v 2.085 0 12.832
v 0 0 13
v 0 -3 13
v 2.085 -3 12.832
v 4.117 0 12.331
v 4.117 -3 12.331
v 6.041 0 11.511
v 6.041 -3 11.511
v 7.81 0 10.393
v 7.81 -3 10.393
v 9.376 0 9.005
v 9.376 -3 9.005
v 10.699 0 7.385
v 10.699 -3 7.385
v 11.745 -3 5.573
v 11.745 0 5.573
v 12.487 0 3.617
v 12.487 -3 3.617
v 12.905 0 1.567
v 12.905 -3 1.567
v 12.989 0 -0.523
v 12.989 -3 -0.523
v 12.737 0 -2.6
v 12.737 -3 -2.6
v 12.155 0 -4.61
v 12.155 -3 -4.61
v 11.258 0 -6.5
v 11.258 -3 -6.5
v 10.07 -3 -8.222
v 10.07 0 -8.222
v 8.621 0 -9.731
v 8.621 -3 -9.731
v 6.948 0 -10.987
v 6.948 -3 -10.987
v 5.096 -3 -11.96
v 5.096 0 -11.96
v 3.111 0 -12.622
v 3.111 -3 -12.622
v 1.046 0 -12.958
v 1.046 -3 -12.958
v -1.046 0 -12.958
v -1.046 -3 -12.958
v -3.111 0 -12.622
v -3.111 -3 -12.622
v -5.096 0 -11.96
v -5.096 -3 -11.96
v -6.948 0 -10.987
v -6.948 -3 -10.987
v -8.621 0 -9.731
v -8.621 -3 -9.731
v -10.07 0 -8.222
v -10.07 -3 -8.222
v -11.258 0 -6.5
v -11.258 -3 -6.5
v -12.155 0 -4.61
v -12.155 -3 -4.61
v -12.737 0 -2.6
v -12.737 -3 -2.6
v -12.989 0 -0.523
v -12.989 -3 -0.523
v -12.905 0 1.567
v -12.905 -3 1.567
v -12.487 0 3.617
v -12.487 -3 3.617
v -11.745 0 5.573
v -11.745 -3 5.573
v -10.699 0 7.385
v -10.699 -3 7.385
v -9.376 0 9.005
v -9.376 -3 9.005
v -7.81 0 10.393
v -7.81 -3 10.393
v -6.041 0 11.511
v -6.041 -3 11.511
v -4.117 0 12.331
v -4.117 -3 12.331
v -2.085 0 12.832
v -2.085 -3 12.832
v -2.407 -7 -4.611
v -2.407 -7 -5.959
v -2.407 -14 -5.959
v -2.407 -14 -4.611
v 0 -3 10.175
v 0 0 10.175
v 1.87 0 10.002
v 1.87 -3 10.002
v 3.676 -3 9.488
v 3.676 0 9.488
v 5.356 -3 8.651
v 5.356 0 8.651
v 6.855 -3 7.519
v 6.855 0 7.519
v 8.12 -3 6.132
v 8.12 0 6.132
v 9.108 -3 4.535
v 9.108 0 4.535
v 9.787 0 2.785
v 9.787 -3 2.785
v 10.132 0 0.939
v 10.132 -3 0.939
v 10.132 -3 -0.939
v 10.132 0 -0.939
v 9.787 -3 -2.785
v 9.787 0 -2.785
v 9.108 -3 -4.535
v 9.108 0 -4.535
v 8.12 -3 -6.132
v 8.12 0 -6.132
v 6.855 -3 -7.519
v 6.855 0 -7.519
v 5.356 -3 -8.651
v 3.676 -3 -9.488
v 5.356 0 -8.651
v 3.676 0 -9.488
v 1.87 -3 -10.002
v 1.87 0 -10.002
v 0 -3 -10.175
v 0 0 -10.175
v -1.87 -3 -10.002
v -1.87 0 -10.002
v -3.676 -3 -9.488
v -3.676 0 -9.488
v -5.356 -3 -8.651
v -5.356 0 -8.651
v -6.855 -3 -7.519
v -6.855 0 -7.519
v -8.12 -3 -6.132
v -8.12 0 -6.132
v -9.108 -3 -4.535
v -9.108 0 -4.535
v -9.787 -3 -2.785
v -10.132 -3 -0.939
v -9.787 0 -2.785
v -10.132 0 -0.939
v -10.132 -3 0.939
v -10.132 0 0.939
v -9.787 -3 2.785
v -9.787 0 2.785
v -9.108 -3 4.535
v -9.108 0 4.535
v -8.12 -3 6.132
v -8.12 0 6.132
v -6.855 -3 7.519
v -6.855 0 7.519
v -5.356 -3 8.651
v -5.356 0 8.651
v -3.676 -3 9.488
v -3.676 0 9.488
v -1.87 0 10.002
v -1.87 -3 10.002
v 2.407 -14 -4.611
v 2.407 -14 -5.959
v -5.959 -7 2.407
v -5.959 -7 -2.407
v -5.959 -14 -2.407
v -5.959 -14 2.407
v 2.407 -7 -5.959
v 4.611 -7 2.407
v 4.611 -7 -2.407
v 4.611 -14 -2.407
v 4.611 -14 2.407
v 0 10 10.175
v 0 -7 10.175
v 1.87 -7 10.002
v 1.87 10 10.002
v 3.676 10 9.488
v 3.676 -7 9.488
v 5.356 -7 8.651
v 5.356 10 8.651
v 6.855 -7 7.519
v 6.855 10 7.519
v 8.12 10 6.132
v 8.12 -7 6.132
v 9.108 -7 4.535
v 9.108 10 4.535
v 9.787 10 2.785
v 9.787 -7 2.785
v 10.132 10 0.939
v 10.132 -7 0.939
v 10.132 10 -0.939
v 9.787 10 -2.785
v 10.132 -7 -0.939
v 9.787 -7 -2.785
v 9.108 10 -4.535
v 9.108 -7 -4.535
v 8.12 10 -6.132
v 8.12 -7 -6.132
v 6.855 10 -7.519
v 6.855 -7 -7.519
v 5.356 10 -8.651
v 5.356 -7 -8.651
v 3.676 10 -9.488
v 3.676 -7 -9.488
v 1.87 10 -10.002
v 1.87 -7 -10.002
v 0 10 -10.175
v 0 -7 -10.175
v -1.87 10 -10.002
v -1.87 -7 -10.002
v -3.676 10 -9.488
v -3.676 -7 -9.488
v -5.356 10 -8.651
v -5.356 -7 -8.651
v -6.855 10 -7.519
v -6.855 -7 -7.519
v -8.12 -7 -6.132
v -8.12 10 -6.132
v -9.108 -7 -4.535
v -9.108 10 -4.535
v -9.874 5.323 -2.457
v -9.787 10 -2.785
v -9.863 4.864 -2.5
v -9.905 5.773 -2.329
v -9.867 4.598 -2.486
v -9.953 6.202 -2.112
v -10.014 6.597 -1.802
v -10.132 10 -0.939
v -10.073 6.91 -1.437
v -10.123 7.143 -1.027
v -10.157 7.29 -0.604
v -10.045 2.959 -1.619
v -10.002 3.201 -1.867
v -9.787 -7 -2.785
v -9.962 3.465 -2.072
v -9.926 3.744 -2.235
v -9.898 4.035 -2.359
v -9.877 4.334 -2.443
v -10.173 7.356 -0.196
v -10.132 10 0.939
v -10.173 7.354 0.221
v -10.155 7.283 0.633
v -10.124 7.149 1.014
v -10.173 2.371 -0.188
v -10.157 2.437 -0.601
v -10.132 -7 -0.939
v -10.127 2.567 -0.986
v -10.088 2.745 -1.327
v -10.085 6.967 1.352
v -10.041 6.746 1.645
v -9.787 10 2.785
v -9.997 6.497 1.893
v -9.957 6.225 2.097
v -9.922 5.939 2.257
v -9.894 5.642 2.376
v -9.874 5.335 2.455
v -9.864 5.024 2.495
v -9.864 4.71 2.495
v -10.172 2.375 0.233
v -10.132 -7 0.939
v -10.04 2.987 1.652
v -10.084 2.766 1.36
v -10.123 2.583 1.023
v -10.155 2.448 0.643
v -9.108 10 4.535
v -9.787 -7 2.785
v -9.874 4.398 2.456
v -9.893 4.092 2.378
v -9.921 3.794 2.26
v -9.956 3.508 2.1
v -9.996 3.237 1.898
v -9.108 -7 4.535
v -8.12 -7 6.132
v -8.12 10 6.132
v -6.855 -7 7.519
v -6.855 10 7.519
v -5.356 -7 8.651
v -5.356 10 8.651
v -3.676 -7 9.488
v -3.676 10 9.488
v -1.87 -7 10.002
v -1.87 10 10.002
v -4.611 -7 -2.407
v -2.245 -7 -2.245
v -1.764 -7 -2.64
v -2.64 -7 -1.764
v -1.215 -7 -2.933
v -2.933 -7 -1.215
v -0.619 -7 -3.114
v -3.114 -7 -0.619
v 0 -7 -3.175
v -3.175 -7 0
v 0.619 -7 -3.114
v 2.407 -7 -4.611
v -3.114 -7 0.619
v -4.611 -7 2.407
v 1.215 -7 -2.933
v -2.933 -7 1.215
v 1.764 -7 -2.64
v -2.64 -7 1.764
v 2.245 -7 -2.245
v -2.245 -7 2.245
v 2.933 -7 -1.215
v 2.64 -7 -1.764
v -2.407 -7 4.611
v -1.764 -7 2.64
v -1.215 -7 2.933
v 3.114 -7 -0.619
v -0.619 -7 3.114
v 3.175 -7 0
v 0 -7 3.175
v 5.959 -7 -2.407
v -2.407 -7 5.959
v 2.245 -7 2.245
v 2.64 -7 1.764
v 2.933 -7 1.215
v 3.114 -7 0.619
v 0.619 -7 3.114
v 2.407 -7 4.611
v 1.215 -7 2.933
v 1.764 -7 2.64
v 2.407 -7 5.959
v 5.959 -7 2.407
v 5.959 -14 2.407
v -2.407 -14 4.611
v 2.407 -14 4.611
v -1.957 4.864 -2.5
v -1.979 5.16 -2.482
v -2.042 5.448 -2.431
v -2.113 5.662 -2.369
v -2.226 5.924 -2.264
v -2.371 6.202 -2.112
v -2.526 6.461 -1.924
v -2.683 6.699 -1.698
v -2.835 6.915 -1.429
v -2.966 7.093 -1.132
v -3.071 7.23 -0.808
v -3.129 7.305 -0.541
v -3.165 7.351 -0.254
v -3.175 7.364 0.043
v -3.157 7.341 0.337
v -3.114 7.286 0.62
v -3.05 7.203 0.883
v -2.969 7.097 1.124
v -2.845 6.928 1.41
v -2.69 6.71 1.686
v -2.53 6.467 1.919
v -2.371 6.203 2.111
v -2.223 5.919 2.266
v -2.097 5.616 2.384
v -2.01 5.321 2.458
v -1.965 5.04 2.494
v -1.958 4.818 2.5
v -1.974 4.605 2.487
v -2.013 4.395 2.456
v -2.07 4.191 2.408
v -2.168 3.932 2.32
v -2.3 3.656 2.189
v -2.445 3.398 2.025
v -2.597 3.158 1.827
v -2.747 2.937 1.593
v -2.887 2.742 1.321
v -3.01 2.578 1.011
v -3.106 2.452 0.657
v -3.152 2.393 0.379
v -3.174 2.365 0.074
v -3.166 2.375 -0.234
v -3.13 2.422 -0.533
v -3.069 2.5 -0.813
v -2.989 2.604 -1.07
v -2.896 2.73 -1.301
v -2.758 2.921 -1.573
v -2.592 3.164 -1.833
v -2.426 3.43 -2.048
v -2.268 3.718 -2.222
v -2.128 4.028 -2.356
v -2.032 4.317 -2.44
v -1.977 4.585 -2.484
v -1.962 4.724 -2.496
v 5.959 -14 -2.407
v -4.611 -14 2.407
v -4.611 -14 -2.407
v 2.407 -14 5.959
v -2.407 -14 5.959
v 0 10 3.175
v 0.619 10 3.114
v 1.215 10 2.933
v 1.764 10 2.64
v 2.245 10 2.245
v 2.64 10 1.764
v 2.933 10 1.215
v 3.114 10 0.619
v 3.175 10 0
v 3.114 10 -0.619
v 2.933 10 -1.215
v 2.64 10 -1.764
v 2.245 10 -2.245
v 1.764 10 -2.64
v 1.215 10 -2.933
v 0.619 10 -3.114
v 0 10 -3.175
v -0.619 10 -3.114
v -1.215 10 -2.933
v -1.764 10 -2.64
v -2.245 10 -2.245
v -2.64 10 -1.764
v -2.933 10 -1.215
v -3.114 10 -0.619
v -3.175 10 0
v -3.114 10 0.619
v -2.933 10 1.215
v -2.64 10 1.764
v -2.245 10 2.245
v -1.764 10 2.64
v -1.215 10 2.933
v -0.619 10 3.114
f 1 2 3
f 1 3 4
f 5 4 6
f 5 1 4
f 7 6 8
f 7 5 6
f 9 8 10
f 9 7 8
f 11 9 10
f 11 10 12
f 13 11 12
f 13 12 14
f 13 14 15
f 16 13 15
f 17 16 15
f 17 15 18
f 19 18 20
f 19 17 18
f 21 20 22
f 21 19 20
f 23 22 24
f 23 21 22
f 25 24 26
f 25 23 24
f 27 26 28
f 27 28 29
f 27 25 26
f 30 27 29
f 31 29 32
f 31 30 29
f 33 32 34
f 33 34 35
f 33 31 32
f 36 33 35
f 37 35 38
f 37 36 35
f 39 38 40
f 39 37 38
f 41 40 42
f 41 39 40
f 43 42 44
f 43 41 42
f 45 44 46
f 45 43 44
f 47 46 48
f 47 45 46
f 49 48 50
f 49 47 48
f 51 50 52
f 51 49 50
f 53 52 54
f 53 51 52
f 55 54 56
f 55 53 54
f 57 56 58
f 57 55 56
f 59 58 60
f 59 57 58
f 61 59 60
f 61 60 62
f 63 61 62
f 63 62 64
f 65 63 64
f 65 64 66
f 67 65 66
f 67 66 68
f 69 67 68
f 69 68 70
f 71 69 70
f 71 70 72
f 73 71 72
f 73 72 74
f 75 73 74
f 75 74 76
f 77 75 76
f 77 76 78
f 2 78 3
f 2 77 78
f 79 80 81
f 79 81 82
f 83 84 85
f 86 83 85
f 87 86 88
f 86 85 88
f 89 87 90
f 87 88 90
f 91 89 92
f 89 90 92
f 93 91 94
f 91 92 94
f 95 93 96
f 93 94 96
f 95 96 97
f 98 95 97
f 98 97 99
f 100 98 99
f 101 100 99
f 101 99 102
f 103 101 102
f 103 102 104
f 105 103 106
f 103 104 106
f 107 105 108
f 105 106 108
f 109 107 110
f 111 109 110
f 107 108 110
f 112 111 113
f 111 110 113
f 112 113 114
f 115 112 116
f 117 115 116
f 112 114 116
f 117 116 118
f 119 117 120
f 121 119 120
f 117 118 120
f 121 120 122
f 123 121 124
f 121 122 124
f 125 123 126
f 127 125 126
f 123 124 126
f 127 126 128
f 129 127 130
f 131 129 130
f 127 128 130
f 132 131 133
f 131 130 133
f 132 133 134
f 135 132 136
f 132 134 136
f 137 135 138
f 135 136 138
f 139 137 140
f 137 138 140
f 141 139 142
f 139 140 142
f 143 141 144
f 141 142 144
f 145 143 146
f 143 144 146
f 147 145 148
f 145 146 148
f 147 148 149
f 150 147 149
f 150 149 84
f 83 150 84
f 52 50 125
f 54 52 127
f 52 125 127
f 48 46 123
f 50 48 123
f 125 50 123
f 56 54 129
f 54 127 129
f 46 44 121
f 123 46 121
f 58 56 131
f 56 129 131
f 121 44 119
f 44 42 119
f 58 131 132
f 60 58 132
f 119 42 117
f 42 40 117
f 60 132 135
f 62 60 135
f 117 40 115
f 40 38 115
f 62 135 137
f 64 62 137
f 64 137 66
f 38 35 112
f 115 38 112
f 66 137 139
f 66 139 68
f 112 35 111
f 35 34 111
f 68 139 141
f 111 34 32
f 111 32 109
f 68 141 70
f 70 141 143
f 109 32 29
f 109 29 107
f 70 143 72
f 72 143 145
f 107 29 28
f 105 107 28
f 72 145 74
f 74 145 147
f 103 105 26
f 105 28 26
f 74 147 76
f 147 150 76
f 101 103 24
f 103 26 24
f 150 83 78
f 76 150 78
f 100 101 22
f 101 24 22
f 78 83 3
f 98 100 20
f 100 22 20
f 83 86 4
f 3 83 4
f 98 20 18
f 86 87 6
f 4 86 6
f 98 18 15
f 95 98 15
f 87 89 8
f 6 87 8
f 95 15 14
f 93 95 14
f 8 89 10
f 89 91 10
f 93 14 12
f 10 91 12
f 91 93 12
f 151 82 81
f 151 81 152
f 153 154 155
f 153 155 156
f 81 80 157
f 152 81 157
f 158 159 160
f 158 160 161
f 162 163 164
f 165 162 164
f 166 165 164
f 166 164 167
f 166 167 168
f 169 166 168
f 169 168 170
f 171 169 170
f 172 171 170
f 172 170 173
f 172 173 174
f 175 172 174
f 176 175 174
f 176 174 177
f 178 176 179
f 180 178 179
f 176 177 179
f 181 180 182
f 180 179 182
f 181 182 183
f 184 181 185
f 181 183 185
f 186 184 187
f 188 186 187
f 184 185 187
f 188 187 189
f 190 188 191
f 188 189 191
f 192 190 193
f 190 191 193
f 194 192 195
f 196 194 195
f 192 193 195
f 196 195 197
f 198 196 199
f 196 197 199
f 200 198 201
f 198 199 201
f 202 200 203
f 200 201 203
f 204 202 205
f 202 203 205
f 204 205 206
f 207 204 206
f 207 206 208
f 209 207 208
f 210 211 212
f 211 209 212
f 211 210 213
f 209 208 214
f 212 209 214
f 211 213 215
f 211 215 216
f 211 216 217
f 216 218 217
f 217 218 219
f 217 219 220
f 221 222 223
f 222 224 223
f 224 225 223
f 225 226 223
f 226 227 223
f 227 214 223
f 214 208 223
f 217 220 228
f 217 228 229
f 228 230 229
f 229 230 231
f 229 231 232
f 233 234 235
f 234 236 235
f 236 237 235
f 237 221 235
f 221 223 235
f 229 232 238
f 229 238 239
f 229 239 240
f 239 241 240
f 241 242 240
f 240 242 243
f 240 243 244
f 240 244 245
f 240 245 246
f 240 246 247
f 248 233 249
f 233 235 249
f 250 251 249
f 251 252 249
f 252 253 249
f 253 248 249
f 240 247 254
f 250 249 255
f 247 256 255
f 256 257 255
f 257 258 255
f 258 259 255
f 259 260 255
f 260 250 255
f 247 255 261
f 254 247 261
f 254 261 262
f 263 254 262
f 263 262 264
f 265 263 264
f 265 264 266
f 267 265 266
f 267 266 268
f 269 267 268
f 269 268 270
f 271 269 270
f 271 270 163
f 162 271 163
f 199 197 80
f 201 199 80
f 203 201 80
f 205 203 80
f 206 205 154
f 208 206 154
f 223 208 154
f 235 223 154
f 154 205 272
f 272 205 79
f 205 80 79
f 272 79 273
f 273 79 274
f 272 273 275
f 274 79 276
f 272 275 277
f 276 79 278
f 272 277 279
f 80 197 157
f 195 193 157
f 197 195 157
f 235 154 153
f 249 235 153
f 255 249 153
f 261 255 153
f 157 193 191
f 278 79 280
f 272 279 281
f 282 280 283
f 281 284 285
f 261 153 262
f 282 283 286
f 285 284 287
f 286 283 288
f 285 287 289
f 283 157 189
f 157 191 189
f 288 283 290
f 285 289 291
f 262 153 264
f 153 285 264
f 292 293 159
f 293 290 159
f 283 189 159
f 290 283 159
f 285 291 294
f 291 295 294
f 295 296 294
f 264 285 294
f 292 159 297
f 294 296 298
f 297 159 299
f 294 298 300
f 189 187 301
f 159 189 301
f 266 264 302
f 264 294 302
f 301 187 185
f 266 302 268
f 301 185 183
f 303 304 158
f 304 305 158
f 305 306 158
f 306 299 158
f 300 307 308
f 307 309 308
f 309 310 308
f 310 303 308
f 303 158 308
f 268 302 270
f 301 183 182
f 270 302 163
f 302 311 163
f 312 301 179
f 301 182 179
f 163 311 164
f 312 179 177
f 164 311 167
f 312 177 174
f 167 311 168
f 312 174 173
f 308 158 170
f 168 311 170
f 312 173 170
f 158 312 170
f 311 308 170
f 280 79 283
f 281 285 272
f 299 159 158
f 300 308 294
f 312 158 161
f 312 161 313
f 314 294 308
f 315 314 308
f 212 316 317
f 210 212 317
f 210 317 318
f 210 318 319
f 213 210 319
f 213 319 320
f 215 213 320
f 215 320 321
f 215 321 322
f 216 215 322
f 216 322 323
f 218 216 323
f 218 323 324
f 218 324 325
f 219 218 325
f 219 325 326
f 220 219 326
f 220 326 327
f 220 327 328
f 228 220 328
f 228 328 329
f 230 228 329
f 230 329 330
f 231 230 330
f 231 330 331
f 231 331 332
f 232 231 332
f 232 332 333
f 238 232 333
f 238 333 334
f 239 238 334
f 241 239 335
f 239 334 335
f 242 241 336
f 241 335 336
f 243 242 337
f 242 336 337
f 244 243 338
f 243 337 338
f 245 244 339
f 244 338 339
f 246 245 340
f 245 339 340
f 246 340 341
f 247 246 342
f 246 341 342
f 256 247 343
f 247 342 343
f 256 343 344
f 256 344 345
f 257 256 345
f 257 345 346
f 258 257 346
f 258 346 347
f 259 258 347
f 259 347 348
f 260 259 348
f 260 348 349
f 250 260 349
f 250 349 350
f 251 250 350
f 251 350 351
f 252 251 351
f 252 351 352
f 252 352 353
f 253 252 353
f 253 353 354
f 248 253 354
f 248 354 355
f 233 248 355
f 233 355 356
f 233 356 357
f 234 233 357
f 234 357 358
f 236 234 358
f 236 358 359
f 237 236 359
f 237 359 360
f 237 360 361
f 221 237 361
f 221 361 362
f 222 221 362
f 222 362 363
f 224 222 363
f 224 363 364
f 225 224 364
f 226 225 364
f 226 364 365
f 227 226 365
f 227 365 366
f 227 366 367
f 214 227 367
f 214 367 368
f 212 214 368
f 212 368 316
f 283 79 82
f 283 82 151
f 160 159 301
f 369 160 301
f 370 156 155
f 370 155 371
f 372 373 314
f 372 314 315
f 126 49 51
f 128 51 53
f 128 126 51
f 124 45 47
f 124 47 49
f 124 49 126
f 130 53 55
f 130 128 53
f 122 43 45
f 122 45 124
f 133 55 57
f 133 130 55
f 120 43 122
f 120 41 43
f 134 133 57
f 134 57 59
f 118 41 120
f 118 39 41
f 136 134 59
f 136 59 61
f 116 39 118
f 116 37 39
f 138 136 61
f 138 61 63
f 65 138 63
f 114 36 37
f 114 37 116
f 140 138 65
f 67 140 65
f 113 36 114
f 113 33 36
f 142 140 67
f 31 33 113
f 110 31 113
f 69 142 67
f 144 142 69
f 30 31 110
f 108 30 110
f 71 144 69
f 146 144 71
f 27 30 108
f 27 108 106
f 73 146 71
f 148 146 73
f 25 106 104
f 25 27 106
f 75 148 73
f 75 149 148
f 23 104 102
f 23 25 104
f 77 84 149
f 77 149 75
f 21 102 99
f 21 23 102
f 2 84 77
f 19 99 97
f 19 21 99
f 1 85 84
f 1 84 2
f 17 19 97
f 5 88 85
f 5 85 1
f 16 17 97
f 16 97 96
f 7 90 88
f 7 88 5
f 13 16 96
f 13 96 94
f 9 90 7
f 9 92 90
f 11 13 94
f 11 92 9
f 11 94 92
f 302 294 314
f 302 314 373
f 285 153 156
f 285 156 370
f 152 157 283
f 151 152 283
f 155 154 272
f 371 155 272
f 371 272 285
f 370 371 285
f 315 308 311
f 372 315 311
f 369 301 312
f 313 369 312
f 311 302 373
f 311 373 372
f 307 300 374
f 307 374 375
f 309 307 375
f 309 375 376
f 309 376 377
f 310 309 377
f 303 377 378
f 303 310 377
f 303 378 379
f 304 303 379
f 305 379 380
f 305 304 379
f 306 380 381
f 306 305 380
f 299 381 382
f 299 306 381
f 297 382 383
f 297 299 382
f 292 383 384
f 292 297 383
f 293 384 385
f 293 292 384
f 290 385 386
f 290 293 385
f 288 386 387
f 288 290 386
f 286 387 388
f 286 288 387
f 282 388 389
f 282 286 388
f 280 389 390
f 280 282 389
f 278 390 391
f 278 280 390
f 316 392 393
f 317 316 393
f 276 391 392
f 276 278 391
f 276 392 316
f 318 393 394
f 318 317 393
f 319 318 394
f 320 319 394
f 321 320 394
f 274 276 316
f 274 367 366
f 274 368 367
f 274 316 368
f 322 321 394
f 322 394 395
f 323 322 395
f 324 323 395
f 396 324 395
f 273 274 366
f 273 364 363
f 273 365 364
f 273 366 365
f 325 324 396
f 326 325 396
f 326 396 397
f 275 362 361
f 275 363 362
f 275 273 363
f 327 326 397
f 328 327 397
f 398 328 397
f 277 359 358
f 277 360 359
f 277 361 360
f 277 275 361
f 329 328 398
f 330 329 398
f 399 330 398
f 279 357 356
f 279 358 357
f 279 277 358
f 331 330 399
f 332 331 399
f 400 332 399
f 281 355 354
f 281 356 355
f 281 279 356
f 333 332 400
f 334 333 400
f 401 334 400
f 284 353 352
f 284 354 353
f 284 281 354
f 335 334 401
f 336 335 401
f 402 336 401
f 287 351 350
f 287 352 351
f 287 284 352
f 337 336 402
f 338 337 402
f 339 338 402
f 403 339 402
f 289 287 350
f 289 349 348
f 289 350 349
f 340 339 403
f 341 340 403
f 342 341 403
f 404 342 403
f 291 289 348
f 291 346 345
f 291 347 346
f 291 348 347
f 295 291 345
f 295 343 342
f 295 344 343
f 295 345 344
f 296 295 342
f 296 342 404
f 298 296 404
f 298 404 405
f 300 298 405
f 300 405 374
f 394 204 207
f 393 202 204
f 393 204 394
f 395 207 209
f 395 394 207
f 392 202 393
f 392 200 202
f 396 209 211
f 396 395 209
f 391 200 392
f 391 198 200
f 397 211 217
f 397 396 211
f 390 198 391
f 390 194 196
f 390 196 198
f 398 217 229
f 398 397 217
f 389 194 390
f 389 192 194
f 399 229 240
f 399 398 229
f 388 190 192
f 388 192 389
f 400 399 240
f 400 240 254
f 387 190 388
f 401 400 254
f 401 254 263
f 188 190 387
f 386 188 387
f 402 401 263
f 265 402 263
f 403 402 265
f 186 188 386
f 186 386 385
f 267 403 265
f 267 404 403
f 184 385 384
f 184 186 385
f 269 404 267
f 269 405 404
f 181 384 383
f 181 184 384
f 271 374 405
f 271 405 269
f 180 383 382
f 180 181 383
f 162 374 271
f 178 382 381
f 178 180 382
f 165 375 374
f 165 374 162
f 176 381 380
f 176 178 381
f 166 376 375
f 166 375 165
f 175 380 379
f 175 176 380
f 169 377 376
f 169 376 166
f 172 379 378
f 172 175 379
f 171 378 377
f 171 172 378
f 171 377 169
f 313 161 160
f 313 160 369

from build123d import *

# Parameters (mm, degrees)
BOSS_EXTRUDE1_DEPTH      = 10
BOSS_EXTRUDE1_DEPTH_BACK = 7
SKETCH1_R                = 10.175
SKETCH1_R_2              = 3.175
SKETCH1_3_R              = 13
SKETCH1_3_R_2            = 10.175
BOSS_EXTRUDE2_DEPTH      = 3
SKETCH2_R                = 2.5
CUT_EXTRUDE1_DEPTH       = 11
SKETCH3_W                = 1.348149628
SKETCH3_H                = 4.814820098
SKETCH3_W_2              = 4.814820098
SKETCH3_H_2              = 1.348149628
BOSS_EXTRUDE3_DEPTH      = 7


with BuildPart() as part:
    # Sketch1 → Boss-Extrude1 (new, two sides: drawn at the far end of the back side and taken through both)
    with BuildSketch(Plane(origin=(0, 0, 0), x_dir=(1, 0, 0), z_dir=(0, 1, 0)).offset(-BOSS_EXTRUDE1_DEPTH_BACK)):
        Circle(SKETCH1_R)
        Circle(SKETCH1_R_2, mode=Mode.SUBTRACT)
    extrude(amount=BOSS_EXTRUDE1_DEPTH + BOSS_EXTRUDE1_DEPTH_BACK)

    # Sketch2 → Cut-Extrude1 (cut)
    with BuildSketch(Plane(origin=(0, 0, 0), x_dir=(0, 0, -1), z_dir=(1, 0, 0))):
        with Locations((0, 4.864105039)):
            Circle(SKETCH2_R)
    extrude(amount=-CUT_EXTRUDE1_DEPTH, mode=Mode.SUBTRACT)

    # Sketch3 → Boss-Extrude3 (add)
    with BuildSketch(Plane.XZ.offset(7)):
        with Locations((5.285239769, 0)):
            Rectangle(SKETCH3_W, SKETCH3_H)
        with Locations((0, 5.285239769)):
            Rectangle(SKETCH3_W_2, SKETCH3_H_2)
        with Locations((0, -5.285239769)):
            Rectangle(SKETCH3_W_2, SKETCH3_H_2)
        with Locations((-5.285239769, 0)):
            Rectangle(SKETCH3_W, SKETCH3_H)
    extrude(amount=BOSS_EXTRUDE3_DEPTH)


with BuildPart() as body_2:
    # Sketch1<3> → Boss-Extrude2 (new body)
    with BuildSketch(Plane(origin=(0, 0, 0), x_dir=(1, 0, 0), z_dir=(0, 1, 0))):
        Circle(SKETCH1_3_R)
        Circle(SKETCH1_3_R_2, mode=Mode.SUBTRACT)
    extrude(amount=-BOSS_EXTRUDE2_DEPTH)


solid = Compound([part.part, body_2.part])
